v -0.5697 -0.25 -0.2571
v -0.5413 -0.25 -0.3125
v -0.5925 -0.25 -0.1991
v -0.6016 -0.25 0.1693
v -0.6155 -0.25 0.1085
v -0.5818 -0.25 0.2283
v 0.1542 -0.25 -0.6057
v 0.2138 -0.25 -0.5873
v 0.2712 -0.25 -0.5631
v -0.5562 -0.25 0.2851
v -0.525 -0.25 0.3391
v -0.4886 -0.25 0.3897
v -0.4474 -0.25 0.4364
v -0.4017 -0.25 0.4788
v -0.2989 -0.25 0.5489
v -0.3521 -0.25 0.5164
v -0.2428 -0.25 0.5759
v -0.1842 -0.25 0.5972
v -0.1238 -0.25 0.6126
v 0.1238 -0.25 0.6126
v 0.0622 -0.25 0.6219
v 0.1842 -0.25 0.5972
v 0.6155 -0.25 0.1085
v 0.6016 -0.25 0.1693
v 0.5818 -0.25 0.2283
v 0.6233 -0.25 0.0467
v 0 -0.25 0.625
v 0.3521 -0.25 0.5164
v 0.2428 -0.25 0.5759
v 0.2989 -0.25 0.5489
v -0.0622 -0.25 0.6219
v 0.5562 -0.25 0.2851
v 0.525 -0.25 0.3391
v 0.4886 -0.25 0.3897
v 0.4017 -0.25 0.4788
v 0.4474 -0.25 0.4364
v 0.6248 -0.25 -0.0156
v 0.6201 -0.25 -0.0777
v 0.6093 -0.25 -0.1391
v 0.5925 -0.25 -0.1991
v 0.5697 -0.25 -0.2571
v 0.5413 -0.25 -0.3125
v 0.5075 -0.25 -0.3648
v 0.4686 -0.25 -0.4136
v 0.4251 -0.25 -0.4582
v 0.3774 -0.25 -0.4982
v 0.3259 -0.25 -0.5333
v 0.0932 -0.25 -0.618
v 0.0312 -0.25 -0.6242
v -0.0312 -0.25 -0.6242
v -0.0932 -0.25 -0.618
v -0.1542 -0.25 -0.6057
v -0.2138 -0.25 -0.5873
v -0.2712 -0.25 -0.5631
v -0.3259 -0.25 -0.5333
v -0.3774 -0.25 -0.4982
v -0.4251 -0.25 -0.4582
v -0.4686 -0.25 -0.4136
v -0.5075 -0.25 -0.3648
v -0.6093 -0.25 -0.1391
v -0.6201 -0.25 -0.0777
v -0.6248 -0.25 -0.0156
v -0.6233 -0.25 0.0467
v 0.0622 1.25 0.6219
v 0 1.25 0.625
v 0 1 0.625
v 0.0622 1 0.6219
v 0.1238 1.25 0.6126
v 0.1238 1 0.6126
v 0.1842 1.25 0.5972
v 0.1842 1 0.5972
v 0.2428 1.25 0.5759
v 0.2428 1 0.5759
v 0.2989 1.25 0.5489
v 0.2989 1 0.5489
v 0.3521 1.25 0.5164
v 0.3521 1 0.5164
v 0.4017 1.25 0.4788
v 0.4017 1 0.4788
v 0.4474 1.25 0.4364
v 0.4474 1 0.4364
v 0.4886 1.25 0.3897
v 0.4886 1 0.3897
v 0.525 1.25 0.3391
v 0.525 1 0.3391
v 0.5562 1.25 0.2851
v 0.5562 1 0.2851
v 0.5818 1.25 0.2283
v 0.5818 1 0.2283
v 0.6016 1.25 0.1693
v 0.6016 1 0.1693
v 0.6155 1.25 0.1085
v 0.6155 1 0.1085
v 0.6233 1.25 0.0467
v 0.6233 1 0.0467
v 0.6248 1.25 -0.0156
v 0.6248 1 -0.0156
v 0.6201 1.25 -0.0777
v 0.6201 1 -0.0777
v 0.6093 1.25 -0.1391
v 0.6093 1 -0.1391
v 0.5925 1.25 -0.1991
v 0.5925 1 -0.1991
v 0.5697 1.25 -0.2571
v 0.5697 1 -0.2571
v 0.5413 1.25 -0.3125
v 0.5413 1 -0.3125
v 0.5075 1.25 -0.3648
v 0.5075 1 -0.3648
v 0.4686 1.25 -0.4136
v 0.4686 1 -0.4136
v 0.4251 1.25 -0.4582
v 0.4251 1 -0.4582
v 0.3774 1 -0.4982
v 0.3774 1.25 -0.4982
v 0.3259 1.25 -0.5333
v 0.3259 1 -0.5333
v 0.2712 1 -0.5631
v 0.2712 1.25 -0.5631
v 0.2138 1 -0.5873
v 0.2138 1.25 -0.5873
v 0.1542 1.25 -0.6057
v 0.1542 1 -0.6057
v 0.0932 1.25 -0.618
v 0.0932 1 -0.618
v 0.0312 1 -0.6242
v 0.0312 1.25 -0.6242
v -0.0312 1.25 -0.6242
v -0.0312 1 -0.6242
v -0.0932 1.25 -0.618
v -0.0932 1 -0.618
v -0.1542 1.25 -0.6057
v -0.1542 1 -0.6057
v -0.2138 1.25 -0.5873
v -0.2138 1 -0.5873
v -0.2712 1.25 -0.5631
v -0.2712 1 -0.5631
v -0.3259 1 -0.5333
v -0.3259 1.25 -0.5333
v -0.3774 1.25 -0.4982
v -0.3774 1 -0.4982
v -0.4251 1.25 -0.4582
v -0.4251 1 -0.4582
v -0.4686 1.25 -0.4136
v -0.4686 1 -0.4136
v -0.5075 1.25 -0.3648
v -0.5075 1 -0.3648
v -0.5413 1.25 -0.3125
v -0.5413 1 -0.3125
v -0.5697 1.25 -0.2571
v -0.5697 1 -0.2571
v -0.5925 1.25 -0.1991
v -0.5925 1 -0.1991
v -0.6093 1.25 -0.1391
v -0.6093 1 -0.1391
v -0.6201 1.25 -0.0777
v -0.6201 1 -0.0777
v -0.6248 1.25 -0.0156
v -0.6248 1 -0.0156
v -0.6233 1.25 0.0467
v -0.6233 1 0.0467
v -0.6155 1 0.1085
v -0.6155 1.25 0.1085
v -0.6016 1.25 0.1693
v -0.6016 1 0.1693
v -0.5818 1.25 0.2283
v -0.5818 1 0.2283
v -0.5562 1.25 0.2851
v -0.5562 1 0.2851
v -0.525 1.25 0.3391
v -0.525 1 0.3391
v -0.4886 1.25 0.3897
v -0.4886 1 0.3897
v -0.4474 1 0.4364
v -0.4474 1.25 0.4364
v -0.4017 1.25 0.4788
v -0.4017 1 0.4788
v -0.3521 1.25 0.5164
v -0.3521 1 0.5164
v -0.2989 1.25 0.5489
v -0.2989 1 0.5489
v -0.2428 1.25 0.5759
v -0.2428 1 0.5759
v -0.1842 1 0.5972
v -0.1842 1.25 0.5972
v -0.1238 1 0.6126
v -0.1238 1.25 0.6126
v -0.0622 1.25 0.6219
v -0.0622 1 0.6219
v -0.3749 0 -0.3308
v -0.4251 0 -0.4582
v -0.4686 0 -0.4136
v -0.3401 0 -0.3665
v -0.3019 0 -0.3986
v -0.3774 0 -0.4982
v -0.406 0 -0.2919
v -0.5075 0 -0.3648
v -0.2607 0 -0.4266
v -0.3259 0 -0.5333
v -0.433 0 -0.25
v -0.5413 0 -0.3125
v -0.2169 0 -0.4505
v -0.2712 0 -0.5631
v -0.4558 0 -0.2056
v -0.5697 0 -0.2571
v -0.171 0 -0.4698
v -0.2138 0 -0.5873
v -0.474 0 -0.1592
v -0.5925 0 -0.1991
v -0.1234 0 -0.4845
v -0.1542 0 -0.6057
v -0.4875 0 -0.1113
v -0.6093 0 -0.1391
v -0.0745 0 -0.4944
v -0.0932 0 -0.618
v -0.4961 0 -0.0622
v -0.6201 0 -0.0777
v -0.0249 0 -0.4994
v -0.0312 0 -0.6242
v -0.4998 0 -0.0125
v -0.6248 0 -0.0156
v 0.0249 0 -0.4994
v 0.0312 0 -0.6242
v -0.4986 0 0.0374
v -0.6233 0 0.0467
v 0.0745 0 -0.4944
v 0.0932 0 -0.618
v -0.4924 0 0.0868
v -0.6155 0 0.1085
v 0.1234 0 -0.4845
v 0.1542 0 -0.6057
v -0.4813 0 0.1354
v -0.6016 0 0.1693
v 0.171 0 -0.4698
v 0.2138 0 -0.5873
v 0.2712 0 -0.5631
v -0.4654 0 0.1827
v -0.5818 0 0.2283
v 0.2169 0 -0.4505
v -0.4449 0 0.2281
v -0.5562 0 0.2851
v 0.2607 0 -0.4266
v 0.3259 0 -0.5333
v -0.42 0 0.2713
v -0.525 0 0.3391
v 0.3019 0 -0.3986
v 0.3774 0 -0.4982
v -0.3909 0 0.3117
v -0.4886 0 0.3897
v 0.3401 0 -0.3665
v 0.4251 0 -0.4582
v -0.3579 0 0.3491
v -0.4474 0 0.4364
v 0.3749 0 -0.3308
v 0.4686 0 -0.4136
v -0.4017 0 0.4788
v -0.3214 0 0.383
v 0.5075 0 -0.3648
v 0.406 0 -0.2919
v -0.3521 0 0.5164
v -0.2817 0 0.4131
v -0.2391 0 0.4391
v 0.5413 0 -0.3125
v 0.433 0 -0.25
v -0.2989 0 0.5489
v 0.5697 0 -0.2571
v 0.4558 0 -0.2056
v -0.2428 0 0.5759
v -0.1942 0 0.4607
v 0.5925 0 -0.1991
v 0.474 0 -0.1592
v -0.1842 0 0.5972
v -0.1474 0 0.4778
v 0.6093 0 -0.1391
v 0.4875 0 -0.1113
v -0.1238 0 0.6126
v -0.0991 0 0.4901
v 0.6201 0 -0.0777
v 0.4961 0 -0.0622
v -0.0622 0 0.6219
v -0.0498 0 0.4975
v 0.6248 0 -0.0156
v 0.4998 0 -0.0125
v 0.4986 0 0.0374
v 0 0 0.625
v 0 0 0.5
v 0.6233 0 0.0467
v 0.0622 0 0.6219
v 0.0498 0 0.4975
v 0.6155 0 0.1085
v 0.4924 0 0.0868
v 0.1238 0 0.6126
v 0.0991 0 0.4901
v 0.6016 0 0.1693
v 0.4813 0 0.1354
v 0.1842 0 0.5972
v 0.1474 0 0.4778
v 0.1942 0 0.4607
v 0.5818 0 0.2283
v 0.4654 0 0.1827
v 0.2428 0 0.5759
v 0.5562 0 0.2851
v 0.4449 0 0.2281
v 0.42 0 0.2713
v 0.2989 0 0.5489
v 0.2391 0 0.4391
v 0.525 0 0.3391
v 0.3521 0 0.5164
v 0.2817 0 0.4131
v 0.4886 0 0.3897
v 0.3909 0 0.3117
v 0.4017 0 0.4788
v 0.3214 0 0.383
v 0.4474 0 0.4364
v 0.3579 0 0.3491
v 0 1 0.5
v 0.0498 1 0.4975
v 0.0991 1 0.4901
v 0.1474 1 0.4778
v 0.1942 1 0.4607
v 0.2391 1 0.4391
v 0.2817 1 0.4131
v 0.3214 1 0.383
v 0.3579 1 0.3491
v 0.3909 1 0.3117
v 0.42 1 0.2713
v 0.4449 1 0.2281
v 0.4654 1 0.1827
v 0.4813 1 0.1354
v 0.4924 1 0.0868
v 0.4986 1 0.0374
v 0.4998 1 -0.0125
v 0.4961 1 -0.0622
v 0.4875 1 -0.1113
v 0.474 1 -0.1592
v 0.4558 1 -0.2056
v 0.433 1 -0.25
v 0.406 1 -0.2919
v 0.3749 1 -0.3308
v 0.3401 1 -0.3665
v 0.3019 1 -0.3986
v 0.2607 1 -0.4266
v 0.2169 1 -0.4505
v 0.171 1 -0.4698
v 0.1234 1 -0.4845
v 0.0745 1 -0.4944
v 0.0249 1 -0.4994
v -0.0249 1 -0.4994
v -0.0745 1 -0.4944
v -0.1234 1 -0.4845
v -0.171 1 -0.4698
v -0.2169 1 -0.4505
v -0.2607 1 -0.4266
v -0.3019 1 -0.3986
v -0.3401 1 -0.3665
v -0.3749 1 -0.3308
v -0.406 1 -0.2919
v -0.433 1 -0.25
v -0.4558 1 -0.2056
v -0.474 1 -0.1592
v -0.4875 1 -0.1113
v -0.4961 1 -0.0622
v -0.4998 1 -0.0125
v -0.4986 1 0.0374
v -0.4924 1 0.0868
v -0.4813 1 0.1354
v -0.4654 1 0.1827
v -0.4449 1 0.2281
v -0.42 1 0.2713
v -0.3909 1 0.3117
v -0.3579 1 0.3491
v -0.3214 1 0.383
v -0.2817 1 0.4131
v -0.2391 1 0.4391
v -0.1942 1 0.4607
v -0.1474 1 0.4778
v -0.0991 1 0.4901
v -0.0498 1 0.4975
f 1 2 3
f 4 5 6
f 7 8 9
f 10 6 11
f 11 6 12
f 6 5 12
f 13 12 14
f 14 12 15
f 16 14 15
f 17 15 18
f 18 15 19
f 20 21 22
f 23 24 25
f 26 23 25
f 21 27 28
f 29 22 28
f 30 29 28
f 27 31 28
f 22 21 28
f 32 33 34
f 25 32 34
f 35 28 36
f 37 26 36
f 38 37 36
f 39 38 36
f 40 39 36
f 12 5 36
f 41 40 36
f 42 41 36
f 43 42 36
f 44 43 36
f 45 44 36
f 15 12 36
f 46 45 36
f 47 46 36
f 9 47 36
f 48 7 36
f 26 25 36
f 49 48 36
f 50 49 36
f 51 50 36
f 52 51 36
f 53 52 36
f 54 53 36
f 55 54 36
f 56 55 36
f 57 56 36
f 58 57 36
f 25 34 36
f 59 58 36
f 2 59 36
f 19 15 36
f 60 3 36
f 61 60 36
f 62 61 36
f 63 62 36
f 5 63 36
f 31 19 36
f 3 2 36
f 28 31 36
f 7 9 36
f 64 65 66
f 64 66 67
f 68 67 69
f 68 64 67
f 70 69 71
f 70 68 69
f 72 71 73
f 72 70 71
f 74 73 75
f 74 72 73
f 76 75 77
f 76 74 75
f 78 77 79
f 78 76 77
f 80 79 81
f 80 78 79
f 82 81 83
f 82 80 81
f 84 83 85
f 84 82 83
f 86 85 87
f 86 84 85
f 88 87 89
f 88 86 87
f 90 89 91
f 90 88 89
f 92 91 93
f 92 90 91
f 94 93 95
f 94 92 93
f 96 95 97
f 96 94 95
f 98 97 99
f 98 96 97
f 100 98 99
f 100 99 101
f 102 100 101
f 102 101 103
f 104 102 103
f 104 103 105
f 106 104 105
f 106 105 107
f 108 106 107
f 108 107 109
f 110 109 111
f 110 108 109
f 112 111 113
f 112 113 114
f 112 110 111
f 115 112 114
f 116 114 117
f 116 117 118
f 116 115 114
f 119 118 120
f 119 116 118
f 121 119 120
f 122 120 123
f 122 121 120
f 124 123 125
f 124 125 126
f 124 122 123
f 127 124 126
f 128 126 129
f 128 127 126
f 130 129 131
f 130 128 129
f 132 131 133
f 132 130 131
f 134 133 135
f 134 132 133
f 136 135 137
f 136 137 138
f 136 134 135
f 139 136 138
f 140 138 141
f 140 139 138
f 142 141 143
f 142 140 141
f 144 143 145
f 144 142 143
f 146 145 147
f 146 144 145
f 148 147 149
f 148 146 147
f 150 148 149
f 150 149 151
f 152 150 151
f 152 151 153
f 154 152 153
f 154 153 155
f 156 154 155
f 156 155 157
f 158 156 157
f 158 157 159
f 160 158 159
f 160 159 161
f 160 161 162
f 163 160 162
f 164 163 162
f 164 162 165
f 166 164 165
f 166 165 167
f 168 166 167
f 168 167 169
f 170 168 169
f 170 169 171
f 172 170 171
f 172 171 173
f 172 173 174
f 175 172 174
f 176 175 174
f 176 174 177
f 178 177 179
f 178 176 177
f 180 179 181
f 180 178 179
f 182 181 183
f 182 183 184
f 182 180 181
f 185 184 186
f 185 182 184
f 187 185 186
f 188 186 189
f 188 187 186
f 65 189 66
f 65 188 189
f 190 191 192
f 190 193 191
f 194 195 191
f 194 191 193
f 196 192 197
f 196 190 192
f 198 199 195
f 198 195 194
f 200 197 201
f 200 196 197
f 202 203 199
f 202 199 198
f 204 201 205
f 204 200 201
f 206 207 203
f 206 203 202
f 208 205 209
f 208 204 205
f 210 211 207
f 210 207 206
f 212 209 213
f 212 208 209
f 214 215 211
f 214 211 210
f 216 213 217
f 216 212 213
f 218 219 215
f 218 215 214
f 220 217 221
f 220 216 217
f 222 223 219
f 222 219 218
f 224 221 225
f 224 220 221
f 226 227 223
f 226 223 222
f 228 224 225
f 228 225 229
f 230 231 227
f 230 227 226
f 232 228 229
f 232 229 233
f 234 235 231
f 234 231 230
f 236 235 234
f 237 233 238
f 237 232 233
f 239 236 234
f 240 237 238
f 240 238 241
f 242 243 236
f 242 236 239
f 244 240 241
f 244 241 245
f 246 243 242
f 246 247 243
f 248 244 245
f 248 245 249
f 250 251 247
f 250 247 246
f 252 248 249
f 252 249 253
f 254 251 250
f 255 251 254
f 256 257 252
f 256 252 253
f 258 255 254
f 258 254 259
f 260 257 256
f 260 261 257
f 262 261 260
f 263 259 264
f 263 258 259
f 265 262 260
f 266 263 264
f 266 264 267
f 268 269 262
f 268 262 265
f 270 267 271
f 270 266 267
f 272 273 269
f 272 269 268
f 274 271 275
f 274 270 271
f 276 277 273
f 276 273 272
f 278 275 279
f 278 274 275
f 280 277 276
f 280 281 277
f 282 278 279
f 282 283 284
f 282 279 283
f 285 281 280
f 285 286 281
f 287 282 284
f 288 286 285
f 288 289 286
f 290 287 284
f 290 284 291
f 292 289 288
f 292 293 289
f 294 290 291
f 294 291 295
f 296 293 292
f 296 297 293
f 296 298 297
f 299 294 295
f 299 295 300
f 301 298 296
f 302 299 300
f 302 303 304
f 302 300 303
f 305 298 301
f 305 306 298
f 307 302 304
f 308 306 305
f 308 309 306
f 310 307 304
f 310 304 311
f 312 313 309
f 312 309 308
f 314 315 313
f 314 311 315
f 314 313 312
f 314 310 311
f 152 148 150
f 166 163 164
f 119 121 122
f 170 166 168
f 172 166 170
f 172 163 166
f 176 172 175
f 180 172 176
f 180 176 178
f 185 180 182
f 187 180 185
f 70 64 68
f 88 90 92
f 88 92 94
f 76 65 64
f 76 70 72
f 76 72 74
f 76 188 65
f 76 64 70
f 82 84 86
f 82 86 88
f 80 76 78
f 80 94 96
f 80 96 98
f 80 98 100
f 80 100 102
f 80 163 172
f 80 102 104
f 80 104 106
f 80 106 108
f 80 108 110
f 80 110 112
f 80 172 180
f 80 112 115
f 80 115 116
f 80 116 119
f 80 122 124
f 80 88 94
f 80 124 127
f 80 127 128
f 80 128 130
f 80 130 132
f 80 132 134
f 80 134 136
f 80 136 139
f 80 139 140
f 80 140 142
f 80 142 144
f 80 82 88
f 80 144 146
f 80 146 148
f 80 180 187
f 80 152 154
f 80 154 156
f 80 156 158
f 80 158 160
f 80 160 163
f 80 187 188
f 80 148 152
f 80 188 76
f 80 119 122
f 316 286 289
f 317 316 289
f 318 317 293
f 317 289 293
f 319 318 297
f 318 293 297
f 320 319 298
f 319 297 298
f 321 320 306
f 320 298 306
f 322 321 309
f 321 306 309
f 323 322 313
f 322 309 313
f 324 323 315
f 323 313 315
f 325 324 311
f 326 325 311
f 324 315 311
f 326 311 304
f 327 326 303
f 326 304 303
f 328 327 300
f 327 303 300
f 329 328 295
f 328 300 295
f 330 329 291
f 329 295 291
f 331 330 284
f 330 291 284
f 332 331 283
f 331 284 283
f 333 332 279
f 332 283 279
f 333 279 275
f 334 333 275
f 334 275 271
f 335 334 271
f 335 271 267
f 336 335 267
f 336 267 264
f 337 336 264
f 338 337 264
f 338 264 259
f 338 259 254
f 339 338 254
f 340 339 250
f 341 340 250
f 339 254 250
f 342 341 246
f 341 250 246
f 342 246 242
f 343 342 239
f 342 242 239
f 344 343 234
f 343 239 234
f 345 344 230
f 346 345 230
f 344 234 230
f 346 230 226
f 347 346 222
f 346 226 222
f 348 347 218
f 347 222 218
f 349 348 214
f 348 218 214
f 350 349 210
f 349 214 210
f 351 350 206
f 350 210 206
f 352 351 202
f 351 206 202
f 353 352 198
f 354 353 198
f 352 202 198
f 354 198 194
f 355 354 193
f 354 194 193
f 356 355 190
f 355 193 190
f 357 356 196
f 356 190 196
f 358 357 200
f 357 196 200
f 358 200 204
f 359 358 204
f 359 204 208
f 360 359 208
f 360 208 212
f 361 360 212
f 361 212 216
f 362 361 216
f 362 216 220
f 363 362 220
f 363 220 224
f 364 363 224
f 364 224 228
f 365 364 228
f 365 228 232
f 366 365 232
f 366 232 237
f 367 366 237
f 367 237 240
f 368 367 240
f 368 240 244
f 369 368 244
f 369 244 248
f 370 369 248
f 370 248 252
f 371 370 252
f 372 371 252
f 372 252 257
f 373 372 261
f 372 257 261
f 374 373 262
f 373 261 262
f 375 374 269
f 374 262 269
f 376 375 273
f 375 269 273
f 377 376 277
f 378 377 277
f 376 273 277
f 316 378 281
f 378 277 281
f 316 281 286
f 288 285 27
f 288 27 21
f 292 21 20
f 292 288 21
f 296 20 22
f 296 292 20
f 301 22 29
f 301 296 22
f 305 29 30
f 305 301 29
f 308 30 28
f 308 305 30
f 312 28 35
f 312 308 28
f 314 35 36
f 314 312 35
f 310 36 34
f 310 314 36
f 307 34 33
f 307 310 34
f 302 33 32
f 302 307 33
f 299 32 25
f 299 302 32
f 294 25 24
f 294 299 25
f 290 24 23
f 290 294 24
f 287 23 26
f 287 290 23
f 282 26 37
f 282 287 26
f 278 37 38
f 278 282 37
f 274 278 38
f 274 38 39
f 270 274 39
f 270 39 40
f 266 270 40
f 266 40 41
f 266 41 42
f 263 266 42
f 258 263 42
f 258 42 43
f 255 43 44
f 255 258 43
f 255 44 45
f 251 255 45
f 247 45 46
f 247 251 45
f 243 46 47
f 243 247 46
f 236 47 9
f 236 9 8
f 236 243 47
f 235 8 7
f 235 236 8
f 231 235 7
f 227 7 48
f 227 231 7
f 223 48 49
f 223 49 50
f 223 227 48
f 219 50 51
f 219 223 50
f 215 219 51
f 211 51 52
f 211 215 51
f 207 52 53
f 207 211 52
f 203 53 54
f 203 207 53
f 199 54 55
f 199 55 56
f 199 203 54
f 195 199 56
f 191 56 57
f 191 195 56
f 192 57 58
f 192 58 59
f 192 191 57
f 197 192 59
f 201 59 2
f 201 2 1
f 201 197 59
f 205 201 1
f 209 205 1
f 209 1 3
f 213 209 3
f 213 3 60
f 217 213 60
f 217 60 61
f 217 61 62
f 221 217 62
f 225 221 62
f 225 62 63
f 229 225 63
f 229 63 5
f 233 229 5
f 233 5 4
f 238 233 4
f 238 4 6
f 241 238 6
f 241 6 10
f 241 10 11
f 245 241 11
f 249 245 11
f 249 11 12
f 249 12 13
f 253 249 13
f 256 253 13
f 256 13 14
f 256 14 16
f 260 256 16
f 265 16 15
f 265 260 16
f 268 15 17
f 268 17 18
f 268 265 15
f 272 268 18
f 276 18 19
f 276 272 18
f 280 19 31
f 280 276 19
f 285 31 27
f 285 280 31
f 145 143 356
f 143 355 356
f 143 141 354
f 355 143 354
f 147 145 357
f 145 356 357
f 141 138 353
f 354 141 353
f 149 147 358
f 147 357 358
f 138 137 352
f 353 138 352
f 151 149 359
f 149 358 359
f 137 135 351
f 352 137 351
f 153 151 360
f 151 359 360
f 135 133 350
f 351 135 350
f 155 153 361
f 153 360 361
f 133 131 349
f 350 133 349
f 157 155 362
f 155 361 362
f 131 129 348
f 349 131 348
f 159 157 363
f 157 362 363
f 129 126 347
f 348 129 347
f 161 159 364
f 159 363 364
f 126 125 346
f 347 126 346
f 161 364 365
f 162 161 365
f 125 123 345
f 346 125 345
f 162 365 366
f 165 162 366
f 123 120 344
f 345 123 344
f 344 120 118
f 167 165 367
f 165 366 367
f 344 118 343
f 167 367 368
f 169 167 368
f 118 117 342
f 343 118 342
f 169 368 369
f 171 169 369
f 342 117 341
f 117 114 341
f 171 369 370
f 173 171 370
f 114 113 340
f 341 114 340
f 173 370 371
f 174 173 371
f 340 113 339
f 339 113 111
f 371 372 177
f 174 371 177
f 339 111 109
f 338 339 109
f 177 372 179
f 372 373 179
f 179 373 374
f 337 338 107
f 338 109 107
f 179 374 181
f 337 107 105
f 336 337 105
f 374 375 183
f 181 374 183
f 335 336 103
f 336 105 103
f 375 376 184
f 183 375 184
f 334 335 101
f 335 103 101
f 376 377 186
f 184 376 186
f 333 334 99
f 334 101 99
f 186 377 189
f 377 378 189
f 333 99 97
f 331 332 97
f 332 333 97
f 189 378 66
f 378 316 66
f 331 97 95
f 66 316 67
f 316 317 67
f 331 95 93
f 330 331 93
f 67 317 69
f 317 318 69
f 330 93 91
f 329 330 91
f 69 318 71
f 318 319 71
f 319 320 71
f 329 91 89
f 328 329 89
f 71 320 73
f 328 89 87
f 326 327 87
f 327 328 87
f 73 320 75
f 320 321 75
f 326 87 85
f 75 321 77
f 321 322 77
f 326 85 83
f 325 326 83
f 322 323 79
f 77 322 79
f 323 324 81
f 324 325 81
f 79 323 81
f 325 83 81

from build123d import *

# Parameters (mm, degrees)
SKETCH1_R           = 0.5
BOSS_EXTRUDE1_DEPTH = 1
SKETCH2_R           = 0.625
BOSS_EXTRUDE2_DEPTH = 0.25
BOSS_EXTRUDE3_START = 0.25
SKETCH3_R           = 0.625
BOSS_EXTRUDE3_DEPTH = 0.25


with BuildPart() as part:
    # Sketch1 → Boss-Extrude1 (new body)
    with BuildSketch(Plane(origin=(0, 0, 0), x_dir=(1, 0, 0), z_dir=(0, 1, 0))):
        with Locations(Location((0, 0, 0), (0, 0, 270))):
            Circle(SKETCH1_R)
    extrude(amount=BOSS_EXTRUDE1_DEPTH)

    # Sketch2 → Boss-Extrude2 (add)
    with BuildSketch(Plane(origin=(0, 0, 0), x_dir=(1, 0, 0), z_dir=(0, 1, 0))):
        with Locations(Location((0, 0, 0), (0, 0, 270))):
            Circle(SKETCH2_R)
    extrude(amount=-BOSS_EXTRUDE2_DEPTH)

    # Sketch3 → Boss-Extrude3 (add)
    with BuildSketch(Plane(origin=(0, 1, 0), x_dir=(1, 0, 0), z_dir=(0, 1, 0)).offset(BOSS_EXTRUDE3_START)):
        with Locations(Location((0, 0, 0), (0, 0, 270))):
            Circle(SKETCH3_R)
    extrude(amount=-BOSS_EXTRUDE3_DEPTH)


solid = part.part
